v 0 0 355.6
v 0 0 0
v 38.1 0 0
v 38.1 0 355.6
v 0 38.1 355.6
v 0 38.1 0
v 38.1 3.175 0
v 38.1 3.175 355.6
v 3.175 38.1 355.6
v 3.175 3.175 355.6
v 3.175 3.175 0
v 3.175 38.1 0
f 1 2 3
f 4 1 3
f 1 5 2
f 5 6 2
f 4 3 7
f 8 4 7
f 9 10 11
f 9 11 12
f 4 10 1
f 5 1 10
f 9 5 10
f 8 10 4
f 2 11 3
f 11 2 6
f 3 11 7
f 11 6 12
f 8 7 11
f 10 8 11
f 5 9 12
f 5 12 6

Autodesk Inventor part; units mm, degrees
ref_plane "YZ Plane" through (0, 0, 0) normal (1, 0, 0) x (0, 1, 0)
ref_plane "XZ Plane" through (0, 0, 0) normal (0, 1, 0) x (-1, 0, 0)
ref_plane "XY Plane" through (0, 0, 0) normal (0, 0, 1) x (1, 0, 0)
sketch "Sketch1" plane through (0, 0, 0) normal (0, 0, 1) x (1, 0, 0)
  line L0 (0, 0) -> (38.1, 0)
  line L1 (38.1, 0) -> (38.1, 3.175)
  line L2 (38.1, 3.175) -> (0, 3.175)
  line L3 (0, 3.175) -> (0, 0)
  dimension "d0" = 38.1
  dimension "d1" = 3.175
extrude "Extrusion1" add sketch "Sketch1" along normal blind 355.6
sketch "Sketch2" plane through (0, 0, 355.6) normal (0, 0, 1) x (1, 0, 0)
  line L0 (0, 0) -> (3.175, 0)
  line L1 (3.175, 0) -> (3.175, 38.1)
  line L2 (3.175, 38.1) -> (0, 38.1)
  line L3 (0, 38.1) -> (0, 0)
  dimension "d4" = 3.175
  dimension "d5" = 38.1
extrude "Extrusion2" add sketch "Sketch2" against normal blind 355.6
properties part number "14in L Channel"
